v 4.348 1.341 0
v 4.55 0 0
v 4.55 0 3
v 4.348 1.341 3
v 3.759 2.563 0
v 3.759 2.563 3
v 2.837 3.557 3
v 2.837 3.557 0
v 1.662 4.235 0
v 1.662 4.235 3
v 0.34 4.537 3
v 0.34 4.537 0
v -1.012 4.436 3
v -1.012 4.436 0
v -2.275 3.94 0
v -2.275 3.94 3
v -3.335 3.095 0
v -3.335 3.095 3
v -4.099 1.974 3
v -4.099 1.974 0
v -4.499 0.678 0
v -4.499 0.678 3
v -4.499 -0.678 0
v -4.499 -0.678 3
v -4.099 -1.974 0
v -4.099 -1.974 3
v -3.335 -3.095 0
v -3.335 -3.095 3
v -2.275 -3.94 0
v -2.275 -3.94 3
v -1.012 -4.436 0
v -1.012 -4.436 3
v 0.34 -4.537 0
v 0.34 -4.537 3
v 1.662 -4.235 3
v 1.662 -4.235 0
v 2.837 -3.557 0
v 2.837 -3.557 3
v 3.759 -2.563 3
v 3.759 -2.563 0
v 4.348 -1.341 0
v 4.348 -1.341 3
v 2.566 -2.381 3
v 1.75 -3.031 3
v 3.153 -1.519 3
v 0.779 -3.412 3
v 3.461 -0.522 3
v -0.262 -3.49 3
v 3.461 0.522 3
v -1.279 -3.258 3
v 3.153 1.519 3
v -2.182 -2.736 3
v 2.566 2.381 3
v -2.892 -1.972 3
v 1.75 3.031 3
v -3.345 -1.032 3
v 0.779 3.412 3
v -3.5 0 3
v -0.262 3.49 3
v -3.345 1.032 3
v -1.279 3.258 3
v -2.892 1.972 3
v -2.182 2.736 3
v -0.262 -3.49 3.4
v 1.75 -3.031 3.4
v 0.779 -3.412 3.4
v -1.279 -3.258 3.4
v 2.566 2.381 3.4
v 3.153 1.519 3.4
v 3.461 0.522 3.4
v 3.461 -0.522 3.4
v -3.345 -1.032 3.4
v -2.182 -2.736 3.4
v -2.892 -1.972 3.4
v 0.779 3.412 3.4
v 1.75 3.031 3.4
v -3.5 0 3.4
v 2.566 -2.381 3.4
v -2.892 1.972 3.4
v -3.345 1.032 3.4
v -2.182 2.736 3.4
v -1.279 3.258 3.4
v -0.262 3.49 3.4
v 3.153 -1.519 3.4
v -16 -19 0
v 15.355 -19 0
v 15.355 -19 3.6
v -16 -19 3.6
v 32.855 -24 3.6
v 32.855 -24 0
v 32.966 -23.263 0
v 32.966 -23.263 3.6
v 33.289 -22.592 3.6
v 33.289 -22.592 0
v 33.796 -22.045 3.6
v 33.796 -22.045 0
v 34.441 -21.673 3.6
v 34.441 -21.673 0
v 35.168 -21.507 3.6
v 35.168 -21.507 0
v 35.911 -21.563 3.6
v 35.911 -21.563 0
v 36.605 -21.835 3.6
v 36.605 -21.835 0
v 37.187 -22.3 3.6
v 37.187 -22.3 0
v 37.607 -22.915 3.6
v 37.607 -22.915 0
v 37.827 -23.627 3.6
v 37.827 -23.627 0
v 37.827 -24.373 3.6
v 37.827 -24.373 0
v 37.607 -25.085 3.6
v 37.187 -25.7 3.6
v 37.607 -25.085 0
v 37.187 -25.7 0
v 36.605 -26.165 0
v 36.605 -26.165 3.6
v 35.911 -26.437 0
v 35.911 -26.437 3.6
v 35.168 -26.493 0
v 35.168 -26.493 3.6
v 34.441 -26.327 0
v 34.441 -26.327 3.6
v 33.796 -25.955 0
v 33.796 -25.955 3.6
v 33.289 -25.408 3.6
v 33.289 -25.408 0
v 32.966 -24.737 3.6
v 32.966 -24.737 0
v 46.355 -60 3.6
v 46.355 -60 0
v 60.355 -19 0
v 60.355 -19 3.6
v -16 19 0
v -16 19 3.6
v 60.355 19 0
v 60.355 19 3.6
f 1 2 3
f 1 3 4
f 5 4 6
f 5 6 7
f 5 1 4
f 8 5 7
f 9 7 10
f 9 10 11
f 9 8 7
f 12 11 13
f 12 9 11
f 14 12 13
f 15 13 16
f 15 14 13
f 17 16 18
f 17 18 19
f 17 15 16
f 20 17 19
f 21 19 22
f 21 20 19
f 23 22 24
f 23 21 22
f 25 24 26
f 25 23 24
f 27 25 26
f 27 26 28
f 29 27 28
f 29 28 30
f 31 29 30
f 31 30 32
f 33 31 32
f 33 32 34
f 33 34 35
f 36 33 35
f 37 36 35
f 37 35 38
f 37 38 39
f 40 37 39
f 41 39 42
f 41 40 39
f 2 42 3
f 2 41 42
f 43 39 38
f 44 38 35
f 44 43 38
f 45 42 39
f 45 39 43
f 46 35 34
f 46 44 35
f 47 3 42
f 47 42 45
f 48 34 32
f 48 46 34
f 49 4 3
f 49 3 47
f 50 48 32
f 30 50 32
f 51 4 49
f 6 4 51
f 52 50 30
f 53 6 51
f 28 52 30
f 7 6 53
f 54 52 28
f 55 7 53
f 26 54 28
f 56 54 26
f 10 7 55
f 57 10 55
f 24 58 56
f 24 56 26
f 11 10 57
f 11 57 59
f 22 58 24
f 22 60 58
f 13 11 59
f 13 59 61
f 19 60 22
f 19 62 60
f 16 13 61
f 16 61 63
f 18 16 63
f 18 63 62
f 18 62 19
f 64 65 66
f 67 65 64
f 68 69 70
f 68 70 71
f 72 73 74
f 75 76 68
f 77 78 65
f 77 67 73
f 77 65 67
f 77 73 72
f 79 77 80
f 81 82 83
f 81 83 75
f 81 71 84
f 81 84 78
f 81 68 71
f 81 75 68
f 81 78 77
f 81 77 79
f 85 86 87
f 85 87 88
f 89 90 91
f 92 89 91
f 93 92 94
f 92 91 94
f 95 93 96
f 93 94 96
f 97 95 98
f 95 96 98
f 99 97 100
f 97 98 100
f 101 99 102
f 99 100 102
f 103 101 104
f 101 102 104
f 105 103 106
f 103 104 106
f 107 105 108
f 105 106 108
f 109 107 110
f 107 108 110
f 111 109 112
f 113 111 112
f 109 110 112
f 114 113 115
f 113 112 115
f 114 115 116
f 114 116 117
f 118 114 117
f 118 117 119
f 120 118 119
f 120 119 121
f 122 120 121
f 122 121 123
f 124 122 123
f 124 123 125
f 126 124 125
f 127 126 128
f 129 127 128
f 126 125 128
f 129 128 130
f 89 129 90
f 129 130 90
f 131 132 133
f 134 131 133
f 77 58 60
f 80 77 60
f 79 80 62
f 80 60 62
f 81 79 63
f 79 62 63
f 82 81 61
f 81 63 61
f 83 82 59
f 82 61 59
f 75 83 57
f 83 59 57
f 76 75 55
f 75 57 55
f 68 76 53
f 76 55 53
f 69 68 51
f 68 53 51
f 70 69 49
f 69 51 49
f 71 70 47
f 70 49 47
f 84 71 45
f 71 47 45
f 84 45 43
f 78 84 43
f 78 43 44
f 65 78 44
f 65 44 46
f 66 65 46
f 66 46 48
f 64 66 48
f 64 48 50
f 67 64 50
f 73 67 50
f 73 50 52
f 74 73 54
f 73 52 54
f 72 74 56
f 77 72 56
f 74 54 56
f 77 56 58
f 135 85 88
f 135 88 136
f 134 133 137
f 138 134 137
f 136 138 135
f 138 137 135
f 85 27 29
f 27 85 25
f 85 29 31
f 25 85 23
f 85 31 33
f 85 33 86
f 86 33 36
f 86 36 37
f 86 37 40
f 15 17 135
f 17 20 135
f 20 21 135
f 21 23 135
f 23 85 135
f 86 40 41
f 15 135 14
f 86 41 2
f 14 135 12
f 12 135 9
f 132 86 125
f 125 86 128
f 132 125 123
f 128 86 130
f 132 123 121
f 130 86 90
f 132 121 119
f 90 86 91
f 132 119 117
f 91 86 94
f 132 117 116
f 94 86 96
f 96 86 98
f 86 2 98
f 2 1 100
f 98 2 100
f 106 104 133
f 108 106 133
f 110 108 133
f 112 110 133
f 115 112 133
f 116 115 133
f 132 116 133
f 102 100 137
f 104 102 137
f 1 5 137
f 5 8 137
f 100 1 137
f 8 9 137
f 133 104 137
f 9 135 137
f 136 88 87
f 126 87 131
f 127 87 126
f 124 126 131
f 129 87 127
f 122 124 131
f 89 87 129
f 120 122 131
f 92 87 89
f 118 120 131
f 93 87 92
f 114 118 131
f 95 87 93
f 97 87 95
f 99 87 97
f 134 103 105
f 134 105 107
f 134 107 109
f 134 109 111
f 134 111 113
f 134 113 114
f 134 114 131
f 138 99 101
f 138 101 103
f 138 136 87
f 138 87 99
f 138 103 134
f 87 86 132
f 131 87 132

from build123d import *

# Parameters (mm, degrees)
SKETCH1_W           = 76.354636869
SKETCH1_H           = 38
SKETCH1_R           = 4.55
BOSS_EXTRUDE1_DEPTH = 3
SKETCH2_W           = 76.354636869
SKETCH2_H           = 38
BOSS_EXTRUDE2_DEPTH = 0.6
SKETCH3_R           = 3.5
CUT_EXTRUDE1_DEPTH  = 0.4
SKETCH4_R           = 2.5
BOSS_EXTRUDE3_DEPTH = 3.6


with BuildPart() as part:
    # Sketch1 → Boss-Extrude1 (new body)
    with BuildSketch(Plane.XY):
        with Locations((22.177318435, 0)):
            Rectangle(SKETCH1_W, SKETCH1_H)
        Circle(SKETCH1_R, mode=Mode.SUBTRACT)
    extrude(amount=BOSS_EXTRUDE1_DEPTH)

    # Sketch2 → Boss-Extrude2 (add)
    with BuildSketch(Plane(origin=(0, 0, 3), x_dir=(-1, 0, 0), z_dir=(0, 0, -1))):
        with Locations((-22.177318435, 0)):
            Rectangle(SKETCH2_W, SKETCH2_H)
    extrude(amount=-BOSS_EXTRUDE2_DEPTH)

    # Sketch3 → Cut-Extrude1 (cut)
    with BuildSketch(Plane(origin=(0, 0, 3), x_dir=(-1, 0, 0), z_dir=(0, 0, -1))):
        Circle(SKETCH3_R)
    extrude(amount=-CUT_EXTRUDE1_DEPTH, mode=Mode.SUBTRACT)

    # Sketch4 → Boss-Extrude3 (add)
    with BuildSketch(Plane(origin=(0, 0, 0), x_dir=(-1, 0, 0), z_dir=(0, 0, -1))):
        Polygon((-15.354636869, -19), (-46.354636869, -60), (-60.354636869, -19), align=None)
        with Locations((-35.354636869, -24)):
            Circle(SKETCH4_R, mode=Mode.SUBTRACT)
    extrude(amount=-BOSS_EXTRUDE3_DEPTH)


solid = part.part
